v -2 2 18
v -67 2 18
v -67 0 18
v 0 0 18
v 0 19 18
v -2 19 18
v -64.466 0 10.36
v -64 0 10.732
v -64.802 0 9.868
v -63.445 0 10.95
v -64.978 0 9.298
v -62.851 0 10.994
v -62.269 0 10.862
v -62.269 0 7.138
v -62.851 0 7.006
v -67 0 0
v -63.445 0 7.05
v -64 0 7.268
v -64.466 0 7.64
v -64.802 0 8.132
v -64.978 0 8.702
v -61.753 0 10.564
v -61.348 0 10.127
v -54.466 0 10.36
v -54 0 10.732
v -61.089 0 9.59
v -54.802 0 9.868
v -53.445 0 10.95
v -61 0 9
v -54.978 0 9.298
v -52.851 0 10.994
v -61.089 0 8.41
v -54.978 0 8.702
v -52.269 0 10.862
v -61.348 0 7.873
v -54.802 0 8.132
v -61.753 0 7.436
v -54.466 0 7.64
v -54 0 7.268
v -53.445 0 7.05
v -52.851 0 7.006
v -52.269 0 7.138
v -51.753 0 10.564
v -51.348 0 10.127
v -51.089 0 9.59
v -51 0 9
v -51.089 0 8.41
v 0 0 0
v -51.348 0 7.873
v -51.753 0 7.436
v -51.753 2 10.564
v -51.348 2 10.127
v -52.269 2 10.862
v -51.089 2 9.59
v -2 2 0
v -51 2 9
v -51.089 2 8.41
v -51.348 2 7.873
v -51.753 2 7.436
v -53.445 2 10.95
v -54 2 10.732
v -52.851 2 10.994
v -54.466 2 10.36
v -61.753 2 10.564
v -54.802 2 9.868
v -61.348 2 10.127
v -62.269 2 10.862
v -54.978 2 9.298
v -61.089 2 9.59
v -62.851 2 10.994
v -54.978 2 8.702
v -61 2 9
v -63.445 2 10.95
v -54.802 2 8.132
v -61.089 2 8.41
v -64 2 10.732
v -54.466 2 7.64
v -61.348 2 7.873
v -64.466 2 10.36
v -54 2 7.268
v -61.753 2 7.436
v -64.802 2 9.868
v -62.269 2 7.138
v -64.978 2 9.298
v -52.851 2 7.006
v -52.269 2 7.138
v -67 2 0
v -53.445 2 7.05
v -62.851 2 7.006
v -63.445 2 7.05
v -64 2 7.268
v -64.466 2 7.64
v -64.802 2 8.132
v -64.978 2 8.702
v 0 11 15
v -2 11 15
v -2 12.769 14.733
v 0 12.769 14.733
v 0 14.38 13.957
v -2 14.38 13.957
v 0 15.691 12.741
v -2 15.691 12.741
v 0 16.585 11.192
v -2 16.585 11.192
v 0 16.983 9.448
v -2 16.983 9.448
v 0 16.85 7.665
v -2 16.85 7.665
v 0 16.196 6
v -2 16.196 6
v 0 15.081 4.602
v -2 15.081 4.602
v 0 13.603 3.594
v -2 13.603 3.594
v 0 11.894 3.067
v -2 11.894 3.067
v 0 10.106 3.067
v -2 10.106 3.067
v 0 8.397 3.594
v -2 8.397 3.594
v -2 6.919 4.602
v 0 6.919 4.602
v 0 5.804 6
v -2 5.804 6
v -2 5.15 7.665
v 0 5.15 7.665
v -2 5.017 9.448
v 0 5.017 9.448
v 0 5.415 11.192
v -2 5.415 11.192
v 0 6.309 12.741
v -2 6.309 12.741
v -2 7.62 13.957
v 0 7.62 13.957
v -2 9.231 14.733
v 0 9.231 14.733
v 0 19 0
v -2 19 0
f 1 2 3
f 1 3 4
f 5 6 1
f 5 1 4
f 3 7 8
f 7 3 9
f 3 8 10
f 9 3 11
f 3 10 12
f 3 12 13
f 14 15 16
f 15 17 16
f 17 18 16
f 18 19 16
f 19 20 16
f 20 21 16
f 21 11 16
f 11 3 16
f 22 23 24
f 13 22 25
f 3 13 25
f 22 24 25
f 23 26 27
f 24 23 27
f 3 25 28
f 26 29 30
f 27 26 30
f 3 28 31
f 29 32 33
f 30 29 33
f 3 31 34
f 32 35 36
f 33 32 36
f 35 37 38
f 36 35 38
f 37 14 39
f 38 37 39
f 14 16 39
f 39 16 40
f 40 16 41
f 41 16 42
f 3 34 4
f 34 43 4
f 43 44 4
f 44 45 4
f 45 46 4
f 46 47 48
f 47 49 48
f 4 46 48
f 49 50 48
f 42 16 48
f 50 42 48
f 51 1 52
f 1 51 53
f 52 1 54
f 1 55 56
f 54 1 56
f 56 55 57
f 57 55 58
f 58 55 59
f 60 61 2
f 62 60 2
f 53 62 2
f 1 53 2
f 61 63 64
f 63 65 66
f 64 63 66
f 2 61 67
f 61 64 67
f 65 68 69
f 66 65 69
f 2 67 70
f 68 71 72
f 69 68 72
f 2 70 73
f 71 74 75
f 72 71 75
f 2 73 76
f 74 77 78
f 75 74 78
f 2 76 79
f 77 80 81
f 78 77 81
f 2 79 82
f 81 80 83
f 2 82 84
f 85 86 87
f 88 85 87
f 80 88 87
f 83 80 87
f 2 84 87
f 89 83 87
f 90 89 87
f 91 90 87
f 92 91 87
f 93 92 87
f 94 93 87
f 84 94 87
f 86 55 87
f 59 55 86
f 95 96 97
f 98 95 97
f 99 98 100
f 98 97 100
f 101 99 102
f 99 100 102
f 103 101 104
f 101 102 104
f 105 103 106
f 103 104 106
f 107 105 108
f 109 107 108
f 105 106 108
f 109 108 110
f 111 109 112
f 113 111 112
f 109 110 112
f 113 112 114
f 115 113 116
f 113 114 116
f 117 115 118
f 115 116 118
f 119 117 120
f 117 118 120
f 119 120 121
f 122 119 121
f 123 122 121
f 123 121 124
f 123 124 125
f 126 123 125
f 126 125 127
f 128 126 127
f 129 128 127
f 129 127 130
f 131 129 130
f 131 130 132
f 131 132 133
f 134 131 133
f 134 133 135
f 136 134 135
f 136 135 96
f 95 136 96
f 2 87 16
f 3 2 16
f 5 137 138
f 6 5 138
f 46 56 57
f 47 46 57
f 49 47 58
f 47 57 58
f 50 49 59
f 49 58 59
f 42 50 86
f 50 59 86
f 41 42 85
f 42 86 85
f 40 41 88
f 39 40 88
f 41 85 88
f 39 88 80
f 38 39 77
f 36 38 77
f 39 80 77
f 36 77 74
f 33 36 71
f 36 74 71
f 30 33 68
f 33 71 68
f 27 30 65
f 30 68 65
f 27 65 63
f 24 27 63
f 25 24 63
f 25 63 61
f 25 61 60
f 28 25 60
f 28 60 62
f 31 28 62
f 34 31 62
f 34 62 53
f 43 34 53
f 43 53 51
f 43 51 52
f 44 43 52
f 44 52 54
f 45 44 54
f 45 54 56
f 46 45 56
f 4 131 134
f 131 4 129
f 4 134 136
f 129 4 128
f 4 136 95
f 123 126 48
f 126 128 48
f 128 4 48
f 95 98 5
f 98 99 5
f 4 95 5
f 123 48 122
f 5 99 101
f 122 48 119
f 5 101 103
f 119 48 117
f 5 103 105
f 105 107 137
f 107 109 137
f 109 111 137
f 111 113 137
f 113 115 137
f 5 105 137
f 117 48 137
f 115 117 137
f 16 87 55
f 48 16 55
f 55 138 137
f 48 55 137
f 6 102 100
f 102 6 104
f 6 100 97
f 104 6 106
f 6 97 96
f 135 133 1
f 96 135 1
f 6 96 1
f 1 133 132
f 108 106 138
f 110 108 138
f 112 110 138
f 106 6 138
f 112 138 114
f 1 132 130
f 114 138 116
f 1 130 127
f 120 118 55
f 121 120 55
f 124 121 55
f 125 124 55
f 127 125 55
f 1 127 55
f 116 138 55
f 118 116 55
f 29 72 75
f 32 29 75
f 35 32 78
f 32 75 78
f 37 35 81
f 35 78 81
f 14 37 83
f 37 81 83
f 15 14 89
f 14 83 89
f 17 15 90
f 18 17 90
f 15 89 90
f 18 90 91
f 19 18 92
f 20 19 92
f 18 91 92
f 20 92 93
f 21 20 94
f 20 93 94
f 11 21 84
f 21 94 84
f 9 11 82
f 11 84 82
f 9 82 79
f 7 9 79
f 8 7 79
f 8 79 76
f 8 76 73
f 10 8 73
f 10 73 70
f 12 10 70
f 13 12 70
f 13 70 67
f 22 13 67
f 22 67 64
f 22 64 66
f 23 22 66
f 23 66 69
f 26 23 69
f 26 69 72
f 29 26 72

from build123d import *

# Parameters (mm, degrees)
BOSS_EXTRUDE1_DEPTH = 18
CUT_EXTRUDE1_REACH  = 4
SKETCH2_R           = 6
CUT_EXTRUDE2_REACH  = 4
SKETCH3_R           = 2


with BuildPart() as part:
    # Sketch1 → Boss-Extrude1 (new body)
    with BuildSketch(Plane.XY):
        Polygon((0, 0), (0, 19), (-2, 19), (-2, 2), (-67, 2), (-67, 0), align=None)
    extrude(amount=BOSS_EXTRUDE1_DEPTH)

    # Sketch2 → Cut-Extrude1 (cut, up to next)
    with BuildSketch(Plane.ZY.offset(2), mode=Mode.PRIVATE) as cut_extrude1_sk1:
        with Locations((9, 11)):
            Circle(SKETCH2_R)
    cut_extrude1_tool1 = extrude(cut_extrude1_sk1.sketch, amount=-CUT_EXTRUDE1_REACH, mode=Mode.PRIVATE) & part.part
    add(cut_extrude1_tool1.solids().sort_by_distance((-2, 11, 9))[0], mode=Mode.SUBTRACT)

    # Sketch3 → Cut-Extrude2 (cut, up to next)
    with BuildSketch(Plane(origin=(0, 2, 0), x_dir=(1, 0, 0), z_dir=(0, 1, 0)), mode=Mode.PRIVATE) as cut_extrude2_sk1:
        with Locations((-63, -9)):
            Circle(SKETCH3_R)
    cut_extrude2_tool1 = extrude(cut_extrude2_sk1.sketch, amount=-CUT_EXTRUDE2_REACH, mode=Mode.PRIVATE) & part.part
    add(cut_extrude2_tool1.solids().sort_by_distance((-63, 2, 9))[0], mode=Mode.SUBTRACT)
    # Sketch3 → Cut-Extrude2 (cut, up to next)
    with BuildSketch(Plane(origin=(0, 2, 0), x_dir=(1, 0, 0), z_dir=(0, 1, 0)), mode=Mode.PRIVATE) as cut_extrude2_sk2:
        with Locations((-53, -9)):
            Circle(SKETCH3_R)
    cut_extrude2_tool2 = extrude(cut_extrude2_sk2.sketch, amount=-CUT_EXTRUDE2_REACH, mode=Mode.PRIVATE) & part.part
    add(cut_extrude2_tool2.solids().sort_by_distance((-53, 2, 9))[0], mode=Mode.SUBTRACT)


solid = part.part
